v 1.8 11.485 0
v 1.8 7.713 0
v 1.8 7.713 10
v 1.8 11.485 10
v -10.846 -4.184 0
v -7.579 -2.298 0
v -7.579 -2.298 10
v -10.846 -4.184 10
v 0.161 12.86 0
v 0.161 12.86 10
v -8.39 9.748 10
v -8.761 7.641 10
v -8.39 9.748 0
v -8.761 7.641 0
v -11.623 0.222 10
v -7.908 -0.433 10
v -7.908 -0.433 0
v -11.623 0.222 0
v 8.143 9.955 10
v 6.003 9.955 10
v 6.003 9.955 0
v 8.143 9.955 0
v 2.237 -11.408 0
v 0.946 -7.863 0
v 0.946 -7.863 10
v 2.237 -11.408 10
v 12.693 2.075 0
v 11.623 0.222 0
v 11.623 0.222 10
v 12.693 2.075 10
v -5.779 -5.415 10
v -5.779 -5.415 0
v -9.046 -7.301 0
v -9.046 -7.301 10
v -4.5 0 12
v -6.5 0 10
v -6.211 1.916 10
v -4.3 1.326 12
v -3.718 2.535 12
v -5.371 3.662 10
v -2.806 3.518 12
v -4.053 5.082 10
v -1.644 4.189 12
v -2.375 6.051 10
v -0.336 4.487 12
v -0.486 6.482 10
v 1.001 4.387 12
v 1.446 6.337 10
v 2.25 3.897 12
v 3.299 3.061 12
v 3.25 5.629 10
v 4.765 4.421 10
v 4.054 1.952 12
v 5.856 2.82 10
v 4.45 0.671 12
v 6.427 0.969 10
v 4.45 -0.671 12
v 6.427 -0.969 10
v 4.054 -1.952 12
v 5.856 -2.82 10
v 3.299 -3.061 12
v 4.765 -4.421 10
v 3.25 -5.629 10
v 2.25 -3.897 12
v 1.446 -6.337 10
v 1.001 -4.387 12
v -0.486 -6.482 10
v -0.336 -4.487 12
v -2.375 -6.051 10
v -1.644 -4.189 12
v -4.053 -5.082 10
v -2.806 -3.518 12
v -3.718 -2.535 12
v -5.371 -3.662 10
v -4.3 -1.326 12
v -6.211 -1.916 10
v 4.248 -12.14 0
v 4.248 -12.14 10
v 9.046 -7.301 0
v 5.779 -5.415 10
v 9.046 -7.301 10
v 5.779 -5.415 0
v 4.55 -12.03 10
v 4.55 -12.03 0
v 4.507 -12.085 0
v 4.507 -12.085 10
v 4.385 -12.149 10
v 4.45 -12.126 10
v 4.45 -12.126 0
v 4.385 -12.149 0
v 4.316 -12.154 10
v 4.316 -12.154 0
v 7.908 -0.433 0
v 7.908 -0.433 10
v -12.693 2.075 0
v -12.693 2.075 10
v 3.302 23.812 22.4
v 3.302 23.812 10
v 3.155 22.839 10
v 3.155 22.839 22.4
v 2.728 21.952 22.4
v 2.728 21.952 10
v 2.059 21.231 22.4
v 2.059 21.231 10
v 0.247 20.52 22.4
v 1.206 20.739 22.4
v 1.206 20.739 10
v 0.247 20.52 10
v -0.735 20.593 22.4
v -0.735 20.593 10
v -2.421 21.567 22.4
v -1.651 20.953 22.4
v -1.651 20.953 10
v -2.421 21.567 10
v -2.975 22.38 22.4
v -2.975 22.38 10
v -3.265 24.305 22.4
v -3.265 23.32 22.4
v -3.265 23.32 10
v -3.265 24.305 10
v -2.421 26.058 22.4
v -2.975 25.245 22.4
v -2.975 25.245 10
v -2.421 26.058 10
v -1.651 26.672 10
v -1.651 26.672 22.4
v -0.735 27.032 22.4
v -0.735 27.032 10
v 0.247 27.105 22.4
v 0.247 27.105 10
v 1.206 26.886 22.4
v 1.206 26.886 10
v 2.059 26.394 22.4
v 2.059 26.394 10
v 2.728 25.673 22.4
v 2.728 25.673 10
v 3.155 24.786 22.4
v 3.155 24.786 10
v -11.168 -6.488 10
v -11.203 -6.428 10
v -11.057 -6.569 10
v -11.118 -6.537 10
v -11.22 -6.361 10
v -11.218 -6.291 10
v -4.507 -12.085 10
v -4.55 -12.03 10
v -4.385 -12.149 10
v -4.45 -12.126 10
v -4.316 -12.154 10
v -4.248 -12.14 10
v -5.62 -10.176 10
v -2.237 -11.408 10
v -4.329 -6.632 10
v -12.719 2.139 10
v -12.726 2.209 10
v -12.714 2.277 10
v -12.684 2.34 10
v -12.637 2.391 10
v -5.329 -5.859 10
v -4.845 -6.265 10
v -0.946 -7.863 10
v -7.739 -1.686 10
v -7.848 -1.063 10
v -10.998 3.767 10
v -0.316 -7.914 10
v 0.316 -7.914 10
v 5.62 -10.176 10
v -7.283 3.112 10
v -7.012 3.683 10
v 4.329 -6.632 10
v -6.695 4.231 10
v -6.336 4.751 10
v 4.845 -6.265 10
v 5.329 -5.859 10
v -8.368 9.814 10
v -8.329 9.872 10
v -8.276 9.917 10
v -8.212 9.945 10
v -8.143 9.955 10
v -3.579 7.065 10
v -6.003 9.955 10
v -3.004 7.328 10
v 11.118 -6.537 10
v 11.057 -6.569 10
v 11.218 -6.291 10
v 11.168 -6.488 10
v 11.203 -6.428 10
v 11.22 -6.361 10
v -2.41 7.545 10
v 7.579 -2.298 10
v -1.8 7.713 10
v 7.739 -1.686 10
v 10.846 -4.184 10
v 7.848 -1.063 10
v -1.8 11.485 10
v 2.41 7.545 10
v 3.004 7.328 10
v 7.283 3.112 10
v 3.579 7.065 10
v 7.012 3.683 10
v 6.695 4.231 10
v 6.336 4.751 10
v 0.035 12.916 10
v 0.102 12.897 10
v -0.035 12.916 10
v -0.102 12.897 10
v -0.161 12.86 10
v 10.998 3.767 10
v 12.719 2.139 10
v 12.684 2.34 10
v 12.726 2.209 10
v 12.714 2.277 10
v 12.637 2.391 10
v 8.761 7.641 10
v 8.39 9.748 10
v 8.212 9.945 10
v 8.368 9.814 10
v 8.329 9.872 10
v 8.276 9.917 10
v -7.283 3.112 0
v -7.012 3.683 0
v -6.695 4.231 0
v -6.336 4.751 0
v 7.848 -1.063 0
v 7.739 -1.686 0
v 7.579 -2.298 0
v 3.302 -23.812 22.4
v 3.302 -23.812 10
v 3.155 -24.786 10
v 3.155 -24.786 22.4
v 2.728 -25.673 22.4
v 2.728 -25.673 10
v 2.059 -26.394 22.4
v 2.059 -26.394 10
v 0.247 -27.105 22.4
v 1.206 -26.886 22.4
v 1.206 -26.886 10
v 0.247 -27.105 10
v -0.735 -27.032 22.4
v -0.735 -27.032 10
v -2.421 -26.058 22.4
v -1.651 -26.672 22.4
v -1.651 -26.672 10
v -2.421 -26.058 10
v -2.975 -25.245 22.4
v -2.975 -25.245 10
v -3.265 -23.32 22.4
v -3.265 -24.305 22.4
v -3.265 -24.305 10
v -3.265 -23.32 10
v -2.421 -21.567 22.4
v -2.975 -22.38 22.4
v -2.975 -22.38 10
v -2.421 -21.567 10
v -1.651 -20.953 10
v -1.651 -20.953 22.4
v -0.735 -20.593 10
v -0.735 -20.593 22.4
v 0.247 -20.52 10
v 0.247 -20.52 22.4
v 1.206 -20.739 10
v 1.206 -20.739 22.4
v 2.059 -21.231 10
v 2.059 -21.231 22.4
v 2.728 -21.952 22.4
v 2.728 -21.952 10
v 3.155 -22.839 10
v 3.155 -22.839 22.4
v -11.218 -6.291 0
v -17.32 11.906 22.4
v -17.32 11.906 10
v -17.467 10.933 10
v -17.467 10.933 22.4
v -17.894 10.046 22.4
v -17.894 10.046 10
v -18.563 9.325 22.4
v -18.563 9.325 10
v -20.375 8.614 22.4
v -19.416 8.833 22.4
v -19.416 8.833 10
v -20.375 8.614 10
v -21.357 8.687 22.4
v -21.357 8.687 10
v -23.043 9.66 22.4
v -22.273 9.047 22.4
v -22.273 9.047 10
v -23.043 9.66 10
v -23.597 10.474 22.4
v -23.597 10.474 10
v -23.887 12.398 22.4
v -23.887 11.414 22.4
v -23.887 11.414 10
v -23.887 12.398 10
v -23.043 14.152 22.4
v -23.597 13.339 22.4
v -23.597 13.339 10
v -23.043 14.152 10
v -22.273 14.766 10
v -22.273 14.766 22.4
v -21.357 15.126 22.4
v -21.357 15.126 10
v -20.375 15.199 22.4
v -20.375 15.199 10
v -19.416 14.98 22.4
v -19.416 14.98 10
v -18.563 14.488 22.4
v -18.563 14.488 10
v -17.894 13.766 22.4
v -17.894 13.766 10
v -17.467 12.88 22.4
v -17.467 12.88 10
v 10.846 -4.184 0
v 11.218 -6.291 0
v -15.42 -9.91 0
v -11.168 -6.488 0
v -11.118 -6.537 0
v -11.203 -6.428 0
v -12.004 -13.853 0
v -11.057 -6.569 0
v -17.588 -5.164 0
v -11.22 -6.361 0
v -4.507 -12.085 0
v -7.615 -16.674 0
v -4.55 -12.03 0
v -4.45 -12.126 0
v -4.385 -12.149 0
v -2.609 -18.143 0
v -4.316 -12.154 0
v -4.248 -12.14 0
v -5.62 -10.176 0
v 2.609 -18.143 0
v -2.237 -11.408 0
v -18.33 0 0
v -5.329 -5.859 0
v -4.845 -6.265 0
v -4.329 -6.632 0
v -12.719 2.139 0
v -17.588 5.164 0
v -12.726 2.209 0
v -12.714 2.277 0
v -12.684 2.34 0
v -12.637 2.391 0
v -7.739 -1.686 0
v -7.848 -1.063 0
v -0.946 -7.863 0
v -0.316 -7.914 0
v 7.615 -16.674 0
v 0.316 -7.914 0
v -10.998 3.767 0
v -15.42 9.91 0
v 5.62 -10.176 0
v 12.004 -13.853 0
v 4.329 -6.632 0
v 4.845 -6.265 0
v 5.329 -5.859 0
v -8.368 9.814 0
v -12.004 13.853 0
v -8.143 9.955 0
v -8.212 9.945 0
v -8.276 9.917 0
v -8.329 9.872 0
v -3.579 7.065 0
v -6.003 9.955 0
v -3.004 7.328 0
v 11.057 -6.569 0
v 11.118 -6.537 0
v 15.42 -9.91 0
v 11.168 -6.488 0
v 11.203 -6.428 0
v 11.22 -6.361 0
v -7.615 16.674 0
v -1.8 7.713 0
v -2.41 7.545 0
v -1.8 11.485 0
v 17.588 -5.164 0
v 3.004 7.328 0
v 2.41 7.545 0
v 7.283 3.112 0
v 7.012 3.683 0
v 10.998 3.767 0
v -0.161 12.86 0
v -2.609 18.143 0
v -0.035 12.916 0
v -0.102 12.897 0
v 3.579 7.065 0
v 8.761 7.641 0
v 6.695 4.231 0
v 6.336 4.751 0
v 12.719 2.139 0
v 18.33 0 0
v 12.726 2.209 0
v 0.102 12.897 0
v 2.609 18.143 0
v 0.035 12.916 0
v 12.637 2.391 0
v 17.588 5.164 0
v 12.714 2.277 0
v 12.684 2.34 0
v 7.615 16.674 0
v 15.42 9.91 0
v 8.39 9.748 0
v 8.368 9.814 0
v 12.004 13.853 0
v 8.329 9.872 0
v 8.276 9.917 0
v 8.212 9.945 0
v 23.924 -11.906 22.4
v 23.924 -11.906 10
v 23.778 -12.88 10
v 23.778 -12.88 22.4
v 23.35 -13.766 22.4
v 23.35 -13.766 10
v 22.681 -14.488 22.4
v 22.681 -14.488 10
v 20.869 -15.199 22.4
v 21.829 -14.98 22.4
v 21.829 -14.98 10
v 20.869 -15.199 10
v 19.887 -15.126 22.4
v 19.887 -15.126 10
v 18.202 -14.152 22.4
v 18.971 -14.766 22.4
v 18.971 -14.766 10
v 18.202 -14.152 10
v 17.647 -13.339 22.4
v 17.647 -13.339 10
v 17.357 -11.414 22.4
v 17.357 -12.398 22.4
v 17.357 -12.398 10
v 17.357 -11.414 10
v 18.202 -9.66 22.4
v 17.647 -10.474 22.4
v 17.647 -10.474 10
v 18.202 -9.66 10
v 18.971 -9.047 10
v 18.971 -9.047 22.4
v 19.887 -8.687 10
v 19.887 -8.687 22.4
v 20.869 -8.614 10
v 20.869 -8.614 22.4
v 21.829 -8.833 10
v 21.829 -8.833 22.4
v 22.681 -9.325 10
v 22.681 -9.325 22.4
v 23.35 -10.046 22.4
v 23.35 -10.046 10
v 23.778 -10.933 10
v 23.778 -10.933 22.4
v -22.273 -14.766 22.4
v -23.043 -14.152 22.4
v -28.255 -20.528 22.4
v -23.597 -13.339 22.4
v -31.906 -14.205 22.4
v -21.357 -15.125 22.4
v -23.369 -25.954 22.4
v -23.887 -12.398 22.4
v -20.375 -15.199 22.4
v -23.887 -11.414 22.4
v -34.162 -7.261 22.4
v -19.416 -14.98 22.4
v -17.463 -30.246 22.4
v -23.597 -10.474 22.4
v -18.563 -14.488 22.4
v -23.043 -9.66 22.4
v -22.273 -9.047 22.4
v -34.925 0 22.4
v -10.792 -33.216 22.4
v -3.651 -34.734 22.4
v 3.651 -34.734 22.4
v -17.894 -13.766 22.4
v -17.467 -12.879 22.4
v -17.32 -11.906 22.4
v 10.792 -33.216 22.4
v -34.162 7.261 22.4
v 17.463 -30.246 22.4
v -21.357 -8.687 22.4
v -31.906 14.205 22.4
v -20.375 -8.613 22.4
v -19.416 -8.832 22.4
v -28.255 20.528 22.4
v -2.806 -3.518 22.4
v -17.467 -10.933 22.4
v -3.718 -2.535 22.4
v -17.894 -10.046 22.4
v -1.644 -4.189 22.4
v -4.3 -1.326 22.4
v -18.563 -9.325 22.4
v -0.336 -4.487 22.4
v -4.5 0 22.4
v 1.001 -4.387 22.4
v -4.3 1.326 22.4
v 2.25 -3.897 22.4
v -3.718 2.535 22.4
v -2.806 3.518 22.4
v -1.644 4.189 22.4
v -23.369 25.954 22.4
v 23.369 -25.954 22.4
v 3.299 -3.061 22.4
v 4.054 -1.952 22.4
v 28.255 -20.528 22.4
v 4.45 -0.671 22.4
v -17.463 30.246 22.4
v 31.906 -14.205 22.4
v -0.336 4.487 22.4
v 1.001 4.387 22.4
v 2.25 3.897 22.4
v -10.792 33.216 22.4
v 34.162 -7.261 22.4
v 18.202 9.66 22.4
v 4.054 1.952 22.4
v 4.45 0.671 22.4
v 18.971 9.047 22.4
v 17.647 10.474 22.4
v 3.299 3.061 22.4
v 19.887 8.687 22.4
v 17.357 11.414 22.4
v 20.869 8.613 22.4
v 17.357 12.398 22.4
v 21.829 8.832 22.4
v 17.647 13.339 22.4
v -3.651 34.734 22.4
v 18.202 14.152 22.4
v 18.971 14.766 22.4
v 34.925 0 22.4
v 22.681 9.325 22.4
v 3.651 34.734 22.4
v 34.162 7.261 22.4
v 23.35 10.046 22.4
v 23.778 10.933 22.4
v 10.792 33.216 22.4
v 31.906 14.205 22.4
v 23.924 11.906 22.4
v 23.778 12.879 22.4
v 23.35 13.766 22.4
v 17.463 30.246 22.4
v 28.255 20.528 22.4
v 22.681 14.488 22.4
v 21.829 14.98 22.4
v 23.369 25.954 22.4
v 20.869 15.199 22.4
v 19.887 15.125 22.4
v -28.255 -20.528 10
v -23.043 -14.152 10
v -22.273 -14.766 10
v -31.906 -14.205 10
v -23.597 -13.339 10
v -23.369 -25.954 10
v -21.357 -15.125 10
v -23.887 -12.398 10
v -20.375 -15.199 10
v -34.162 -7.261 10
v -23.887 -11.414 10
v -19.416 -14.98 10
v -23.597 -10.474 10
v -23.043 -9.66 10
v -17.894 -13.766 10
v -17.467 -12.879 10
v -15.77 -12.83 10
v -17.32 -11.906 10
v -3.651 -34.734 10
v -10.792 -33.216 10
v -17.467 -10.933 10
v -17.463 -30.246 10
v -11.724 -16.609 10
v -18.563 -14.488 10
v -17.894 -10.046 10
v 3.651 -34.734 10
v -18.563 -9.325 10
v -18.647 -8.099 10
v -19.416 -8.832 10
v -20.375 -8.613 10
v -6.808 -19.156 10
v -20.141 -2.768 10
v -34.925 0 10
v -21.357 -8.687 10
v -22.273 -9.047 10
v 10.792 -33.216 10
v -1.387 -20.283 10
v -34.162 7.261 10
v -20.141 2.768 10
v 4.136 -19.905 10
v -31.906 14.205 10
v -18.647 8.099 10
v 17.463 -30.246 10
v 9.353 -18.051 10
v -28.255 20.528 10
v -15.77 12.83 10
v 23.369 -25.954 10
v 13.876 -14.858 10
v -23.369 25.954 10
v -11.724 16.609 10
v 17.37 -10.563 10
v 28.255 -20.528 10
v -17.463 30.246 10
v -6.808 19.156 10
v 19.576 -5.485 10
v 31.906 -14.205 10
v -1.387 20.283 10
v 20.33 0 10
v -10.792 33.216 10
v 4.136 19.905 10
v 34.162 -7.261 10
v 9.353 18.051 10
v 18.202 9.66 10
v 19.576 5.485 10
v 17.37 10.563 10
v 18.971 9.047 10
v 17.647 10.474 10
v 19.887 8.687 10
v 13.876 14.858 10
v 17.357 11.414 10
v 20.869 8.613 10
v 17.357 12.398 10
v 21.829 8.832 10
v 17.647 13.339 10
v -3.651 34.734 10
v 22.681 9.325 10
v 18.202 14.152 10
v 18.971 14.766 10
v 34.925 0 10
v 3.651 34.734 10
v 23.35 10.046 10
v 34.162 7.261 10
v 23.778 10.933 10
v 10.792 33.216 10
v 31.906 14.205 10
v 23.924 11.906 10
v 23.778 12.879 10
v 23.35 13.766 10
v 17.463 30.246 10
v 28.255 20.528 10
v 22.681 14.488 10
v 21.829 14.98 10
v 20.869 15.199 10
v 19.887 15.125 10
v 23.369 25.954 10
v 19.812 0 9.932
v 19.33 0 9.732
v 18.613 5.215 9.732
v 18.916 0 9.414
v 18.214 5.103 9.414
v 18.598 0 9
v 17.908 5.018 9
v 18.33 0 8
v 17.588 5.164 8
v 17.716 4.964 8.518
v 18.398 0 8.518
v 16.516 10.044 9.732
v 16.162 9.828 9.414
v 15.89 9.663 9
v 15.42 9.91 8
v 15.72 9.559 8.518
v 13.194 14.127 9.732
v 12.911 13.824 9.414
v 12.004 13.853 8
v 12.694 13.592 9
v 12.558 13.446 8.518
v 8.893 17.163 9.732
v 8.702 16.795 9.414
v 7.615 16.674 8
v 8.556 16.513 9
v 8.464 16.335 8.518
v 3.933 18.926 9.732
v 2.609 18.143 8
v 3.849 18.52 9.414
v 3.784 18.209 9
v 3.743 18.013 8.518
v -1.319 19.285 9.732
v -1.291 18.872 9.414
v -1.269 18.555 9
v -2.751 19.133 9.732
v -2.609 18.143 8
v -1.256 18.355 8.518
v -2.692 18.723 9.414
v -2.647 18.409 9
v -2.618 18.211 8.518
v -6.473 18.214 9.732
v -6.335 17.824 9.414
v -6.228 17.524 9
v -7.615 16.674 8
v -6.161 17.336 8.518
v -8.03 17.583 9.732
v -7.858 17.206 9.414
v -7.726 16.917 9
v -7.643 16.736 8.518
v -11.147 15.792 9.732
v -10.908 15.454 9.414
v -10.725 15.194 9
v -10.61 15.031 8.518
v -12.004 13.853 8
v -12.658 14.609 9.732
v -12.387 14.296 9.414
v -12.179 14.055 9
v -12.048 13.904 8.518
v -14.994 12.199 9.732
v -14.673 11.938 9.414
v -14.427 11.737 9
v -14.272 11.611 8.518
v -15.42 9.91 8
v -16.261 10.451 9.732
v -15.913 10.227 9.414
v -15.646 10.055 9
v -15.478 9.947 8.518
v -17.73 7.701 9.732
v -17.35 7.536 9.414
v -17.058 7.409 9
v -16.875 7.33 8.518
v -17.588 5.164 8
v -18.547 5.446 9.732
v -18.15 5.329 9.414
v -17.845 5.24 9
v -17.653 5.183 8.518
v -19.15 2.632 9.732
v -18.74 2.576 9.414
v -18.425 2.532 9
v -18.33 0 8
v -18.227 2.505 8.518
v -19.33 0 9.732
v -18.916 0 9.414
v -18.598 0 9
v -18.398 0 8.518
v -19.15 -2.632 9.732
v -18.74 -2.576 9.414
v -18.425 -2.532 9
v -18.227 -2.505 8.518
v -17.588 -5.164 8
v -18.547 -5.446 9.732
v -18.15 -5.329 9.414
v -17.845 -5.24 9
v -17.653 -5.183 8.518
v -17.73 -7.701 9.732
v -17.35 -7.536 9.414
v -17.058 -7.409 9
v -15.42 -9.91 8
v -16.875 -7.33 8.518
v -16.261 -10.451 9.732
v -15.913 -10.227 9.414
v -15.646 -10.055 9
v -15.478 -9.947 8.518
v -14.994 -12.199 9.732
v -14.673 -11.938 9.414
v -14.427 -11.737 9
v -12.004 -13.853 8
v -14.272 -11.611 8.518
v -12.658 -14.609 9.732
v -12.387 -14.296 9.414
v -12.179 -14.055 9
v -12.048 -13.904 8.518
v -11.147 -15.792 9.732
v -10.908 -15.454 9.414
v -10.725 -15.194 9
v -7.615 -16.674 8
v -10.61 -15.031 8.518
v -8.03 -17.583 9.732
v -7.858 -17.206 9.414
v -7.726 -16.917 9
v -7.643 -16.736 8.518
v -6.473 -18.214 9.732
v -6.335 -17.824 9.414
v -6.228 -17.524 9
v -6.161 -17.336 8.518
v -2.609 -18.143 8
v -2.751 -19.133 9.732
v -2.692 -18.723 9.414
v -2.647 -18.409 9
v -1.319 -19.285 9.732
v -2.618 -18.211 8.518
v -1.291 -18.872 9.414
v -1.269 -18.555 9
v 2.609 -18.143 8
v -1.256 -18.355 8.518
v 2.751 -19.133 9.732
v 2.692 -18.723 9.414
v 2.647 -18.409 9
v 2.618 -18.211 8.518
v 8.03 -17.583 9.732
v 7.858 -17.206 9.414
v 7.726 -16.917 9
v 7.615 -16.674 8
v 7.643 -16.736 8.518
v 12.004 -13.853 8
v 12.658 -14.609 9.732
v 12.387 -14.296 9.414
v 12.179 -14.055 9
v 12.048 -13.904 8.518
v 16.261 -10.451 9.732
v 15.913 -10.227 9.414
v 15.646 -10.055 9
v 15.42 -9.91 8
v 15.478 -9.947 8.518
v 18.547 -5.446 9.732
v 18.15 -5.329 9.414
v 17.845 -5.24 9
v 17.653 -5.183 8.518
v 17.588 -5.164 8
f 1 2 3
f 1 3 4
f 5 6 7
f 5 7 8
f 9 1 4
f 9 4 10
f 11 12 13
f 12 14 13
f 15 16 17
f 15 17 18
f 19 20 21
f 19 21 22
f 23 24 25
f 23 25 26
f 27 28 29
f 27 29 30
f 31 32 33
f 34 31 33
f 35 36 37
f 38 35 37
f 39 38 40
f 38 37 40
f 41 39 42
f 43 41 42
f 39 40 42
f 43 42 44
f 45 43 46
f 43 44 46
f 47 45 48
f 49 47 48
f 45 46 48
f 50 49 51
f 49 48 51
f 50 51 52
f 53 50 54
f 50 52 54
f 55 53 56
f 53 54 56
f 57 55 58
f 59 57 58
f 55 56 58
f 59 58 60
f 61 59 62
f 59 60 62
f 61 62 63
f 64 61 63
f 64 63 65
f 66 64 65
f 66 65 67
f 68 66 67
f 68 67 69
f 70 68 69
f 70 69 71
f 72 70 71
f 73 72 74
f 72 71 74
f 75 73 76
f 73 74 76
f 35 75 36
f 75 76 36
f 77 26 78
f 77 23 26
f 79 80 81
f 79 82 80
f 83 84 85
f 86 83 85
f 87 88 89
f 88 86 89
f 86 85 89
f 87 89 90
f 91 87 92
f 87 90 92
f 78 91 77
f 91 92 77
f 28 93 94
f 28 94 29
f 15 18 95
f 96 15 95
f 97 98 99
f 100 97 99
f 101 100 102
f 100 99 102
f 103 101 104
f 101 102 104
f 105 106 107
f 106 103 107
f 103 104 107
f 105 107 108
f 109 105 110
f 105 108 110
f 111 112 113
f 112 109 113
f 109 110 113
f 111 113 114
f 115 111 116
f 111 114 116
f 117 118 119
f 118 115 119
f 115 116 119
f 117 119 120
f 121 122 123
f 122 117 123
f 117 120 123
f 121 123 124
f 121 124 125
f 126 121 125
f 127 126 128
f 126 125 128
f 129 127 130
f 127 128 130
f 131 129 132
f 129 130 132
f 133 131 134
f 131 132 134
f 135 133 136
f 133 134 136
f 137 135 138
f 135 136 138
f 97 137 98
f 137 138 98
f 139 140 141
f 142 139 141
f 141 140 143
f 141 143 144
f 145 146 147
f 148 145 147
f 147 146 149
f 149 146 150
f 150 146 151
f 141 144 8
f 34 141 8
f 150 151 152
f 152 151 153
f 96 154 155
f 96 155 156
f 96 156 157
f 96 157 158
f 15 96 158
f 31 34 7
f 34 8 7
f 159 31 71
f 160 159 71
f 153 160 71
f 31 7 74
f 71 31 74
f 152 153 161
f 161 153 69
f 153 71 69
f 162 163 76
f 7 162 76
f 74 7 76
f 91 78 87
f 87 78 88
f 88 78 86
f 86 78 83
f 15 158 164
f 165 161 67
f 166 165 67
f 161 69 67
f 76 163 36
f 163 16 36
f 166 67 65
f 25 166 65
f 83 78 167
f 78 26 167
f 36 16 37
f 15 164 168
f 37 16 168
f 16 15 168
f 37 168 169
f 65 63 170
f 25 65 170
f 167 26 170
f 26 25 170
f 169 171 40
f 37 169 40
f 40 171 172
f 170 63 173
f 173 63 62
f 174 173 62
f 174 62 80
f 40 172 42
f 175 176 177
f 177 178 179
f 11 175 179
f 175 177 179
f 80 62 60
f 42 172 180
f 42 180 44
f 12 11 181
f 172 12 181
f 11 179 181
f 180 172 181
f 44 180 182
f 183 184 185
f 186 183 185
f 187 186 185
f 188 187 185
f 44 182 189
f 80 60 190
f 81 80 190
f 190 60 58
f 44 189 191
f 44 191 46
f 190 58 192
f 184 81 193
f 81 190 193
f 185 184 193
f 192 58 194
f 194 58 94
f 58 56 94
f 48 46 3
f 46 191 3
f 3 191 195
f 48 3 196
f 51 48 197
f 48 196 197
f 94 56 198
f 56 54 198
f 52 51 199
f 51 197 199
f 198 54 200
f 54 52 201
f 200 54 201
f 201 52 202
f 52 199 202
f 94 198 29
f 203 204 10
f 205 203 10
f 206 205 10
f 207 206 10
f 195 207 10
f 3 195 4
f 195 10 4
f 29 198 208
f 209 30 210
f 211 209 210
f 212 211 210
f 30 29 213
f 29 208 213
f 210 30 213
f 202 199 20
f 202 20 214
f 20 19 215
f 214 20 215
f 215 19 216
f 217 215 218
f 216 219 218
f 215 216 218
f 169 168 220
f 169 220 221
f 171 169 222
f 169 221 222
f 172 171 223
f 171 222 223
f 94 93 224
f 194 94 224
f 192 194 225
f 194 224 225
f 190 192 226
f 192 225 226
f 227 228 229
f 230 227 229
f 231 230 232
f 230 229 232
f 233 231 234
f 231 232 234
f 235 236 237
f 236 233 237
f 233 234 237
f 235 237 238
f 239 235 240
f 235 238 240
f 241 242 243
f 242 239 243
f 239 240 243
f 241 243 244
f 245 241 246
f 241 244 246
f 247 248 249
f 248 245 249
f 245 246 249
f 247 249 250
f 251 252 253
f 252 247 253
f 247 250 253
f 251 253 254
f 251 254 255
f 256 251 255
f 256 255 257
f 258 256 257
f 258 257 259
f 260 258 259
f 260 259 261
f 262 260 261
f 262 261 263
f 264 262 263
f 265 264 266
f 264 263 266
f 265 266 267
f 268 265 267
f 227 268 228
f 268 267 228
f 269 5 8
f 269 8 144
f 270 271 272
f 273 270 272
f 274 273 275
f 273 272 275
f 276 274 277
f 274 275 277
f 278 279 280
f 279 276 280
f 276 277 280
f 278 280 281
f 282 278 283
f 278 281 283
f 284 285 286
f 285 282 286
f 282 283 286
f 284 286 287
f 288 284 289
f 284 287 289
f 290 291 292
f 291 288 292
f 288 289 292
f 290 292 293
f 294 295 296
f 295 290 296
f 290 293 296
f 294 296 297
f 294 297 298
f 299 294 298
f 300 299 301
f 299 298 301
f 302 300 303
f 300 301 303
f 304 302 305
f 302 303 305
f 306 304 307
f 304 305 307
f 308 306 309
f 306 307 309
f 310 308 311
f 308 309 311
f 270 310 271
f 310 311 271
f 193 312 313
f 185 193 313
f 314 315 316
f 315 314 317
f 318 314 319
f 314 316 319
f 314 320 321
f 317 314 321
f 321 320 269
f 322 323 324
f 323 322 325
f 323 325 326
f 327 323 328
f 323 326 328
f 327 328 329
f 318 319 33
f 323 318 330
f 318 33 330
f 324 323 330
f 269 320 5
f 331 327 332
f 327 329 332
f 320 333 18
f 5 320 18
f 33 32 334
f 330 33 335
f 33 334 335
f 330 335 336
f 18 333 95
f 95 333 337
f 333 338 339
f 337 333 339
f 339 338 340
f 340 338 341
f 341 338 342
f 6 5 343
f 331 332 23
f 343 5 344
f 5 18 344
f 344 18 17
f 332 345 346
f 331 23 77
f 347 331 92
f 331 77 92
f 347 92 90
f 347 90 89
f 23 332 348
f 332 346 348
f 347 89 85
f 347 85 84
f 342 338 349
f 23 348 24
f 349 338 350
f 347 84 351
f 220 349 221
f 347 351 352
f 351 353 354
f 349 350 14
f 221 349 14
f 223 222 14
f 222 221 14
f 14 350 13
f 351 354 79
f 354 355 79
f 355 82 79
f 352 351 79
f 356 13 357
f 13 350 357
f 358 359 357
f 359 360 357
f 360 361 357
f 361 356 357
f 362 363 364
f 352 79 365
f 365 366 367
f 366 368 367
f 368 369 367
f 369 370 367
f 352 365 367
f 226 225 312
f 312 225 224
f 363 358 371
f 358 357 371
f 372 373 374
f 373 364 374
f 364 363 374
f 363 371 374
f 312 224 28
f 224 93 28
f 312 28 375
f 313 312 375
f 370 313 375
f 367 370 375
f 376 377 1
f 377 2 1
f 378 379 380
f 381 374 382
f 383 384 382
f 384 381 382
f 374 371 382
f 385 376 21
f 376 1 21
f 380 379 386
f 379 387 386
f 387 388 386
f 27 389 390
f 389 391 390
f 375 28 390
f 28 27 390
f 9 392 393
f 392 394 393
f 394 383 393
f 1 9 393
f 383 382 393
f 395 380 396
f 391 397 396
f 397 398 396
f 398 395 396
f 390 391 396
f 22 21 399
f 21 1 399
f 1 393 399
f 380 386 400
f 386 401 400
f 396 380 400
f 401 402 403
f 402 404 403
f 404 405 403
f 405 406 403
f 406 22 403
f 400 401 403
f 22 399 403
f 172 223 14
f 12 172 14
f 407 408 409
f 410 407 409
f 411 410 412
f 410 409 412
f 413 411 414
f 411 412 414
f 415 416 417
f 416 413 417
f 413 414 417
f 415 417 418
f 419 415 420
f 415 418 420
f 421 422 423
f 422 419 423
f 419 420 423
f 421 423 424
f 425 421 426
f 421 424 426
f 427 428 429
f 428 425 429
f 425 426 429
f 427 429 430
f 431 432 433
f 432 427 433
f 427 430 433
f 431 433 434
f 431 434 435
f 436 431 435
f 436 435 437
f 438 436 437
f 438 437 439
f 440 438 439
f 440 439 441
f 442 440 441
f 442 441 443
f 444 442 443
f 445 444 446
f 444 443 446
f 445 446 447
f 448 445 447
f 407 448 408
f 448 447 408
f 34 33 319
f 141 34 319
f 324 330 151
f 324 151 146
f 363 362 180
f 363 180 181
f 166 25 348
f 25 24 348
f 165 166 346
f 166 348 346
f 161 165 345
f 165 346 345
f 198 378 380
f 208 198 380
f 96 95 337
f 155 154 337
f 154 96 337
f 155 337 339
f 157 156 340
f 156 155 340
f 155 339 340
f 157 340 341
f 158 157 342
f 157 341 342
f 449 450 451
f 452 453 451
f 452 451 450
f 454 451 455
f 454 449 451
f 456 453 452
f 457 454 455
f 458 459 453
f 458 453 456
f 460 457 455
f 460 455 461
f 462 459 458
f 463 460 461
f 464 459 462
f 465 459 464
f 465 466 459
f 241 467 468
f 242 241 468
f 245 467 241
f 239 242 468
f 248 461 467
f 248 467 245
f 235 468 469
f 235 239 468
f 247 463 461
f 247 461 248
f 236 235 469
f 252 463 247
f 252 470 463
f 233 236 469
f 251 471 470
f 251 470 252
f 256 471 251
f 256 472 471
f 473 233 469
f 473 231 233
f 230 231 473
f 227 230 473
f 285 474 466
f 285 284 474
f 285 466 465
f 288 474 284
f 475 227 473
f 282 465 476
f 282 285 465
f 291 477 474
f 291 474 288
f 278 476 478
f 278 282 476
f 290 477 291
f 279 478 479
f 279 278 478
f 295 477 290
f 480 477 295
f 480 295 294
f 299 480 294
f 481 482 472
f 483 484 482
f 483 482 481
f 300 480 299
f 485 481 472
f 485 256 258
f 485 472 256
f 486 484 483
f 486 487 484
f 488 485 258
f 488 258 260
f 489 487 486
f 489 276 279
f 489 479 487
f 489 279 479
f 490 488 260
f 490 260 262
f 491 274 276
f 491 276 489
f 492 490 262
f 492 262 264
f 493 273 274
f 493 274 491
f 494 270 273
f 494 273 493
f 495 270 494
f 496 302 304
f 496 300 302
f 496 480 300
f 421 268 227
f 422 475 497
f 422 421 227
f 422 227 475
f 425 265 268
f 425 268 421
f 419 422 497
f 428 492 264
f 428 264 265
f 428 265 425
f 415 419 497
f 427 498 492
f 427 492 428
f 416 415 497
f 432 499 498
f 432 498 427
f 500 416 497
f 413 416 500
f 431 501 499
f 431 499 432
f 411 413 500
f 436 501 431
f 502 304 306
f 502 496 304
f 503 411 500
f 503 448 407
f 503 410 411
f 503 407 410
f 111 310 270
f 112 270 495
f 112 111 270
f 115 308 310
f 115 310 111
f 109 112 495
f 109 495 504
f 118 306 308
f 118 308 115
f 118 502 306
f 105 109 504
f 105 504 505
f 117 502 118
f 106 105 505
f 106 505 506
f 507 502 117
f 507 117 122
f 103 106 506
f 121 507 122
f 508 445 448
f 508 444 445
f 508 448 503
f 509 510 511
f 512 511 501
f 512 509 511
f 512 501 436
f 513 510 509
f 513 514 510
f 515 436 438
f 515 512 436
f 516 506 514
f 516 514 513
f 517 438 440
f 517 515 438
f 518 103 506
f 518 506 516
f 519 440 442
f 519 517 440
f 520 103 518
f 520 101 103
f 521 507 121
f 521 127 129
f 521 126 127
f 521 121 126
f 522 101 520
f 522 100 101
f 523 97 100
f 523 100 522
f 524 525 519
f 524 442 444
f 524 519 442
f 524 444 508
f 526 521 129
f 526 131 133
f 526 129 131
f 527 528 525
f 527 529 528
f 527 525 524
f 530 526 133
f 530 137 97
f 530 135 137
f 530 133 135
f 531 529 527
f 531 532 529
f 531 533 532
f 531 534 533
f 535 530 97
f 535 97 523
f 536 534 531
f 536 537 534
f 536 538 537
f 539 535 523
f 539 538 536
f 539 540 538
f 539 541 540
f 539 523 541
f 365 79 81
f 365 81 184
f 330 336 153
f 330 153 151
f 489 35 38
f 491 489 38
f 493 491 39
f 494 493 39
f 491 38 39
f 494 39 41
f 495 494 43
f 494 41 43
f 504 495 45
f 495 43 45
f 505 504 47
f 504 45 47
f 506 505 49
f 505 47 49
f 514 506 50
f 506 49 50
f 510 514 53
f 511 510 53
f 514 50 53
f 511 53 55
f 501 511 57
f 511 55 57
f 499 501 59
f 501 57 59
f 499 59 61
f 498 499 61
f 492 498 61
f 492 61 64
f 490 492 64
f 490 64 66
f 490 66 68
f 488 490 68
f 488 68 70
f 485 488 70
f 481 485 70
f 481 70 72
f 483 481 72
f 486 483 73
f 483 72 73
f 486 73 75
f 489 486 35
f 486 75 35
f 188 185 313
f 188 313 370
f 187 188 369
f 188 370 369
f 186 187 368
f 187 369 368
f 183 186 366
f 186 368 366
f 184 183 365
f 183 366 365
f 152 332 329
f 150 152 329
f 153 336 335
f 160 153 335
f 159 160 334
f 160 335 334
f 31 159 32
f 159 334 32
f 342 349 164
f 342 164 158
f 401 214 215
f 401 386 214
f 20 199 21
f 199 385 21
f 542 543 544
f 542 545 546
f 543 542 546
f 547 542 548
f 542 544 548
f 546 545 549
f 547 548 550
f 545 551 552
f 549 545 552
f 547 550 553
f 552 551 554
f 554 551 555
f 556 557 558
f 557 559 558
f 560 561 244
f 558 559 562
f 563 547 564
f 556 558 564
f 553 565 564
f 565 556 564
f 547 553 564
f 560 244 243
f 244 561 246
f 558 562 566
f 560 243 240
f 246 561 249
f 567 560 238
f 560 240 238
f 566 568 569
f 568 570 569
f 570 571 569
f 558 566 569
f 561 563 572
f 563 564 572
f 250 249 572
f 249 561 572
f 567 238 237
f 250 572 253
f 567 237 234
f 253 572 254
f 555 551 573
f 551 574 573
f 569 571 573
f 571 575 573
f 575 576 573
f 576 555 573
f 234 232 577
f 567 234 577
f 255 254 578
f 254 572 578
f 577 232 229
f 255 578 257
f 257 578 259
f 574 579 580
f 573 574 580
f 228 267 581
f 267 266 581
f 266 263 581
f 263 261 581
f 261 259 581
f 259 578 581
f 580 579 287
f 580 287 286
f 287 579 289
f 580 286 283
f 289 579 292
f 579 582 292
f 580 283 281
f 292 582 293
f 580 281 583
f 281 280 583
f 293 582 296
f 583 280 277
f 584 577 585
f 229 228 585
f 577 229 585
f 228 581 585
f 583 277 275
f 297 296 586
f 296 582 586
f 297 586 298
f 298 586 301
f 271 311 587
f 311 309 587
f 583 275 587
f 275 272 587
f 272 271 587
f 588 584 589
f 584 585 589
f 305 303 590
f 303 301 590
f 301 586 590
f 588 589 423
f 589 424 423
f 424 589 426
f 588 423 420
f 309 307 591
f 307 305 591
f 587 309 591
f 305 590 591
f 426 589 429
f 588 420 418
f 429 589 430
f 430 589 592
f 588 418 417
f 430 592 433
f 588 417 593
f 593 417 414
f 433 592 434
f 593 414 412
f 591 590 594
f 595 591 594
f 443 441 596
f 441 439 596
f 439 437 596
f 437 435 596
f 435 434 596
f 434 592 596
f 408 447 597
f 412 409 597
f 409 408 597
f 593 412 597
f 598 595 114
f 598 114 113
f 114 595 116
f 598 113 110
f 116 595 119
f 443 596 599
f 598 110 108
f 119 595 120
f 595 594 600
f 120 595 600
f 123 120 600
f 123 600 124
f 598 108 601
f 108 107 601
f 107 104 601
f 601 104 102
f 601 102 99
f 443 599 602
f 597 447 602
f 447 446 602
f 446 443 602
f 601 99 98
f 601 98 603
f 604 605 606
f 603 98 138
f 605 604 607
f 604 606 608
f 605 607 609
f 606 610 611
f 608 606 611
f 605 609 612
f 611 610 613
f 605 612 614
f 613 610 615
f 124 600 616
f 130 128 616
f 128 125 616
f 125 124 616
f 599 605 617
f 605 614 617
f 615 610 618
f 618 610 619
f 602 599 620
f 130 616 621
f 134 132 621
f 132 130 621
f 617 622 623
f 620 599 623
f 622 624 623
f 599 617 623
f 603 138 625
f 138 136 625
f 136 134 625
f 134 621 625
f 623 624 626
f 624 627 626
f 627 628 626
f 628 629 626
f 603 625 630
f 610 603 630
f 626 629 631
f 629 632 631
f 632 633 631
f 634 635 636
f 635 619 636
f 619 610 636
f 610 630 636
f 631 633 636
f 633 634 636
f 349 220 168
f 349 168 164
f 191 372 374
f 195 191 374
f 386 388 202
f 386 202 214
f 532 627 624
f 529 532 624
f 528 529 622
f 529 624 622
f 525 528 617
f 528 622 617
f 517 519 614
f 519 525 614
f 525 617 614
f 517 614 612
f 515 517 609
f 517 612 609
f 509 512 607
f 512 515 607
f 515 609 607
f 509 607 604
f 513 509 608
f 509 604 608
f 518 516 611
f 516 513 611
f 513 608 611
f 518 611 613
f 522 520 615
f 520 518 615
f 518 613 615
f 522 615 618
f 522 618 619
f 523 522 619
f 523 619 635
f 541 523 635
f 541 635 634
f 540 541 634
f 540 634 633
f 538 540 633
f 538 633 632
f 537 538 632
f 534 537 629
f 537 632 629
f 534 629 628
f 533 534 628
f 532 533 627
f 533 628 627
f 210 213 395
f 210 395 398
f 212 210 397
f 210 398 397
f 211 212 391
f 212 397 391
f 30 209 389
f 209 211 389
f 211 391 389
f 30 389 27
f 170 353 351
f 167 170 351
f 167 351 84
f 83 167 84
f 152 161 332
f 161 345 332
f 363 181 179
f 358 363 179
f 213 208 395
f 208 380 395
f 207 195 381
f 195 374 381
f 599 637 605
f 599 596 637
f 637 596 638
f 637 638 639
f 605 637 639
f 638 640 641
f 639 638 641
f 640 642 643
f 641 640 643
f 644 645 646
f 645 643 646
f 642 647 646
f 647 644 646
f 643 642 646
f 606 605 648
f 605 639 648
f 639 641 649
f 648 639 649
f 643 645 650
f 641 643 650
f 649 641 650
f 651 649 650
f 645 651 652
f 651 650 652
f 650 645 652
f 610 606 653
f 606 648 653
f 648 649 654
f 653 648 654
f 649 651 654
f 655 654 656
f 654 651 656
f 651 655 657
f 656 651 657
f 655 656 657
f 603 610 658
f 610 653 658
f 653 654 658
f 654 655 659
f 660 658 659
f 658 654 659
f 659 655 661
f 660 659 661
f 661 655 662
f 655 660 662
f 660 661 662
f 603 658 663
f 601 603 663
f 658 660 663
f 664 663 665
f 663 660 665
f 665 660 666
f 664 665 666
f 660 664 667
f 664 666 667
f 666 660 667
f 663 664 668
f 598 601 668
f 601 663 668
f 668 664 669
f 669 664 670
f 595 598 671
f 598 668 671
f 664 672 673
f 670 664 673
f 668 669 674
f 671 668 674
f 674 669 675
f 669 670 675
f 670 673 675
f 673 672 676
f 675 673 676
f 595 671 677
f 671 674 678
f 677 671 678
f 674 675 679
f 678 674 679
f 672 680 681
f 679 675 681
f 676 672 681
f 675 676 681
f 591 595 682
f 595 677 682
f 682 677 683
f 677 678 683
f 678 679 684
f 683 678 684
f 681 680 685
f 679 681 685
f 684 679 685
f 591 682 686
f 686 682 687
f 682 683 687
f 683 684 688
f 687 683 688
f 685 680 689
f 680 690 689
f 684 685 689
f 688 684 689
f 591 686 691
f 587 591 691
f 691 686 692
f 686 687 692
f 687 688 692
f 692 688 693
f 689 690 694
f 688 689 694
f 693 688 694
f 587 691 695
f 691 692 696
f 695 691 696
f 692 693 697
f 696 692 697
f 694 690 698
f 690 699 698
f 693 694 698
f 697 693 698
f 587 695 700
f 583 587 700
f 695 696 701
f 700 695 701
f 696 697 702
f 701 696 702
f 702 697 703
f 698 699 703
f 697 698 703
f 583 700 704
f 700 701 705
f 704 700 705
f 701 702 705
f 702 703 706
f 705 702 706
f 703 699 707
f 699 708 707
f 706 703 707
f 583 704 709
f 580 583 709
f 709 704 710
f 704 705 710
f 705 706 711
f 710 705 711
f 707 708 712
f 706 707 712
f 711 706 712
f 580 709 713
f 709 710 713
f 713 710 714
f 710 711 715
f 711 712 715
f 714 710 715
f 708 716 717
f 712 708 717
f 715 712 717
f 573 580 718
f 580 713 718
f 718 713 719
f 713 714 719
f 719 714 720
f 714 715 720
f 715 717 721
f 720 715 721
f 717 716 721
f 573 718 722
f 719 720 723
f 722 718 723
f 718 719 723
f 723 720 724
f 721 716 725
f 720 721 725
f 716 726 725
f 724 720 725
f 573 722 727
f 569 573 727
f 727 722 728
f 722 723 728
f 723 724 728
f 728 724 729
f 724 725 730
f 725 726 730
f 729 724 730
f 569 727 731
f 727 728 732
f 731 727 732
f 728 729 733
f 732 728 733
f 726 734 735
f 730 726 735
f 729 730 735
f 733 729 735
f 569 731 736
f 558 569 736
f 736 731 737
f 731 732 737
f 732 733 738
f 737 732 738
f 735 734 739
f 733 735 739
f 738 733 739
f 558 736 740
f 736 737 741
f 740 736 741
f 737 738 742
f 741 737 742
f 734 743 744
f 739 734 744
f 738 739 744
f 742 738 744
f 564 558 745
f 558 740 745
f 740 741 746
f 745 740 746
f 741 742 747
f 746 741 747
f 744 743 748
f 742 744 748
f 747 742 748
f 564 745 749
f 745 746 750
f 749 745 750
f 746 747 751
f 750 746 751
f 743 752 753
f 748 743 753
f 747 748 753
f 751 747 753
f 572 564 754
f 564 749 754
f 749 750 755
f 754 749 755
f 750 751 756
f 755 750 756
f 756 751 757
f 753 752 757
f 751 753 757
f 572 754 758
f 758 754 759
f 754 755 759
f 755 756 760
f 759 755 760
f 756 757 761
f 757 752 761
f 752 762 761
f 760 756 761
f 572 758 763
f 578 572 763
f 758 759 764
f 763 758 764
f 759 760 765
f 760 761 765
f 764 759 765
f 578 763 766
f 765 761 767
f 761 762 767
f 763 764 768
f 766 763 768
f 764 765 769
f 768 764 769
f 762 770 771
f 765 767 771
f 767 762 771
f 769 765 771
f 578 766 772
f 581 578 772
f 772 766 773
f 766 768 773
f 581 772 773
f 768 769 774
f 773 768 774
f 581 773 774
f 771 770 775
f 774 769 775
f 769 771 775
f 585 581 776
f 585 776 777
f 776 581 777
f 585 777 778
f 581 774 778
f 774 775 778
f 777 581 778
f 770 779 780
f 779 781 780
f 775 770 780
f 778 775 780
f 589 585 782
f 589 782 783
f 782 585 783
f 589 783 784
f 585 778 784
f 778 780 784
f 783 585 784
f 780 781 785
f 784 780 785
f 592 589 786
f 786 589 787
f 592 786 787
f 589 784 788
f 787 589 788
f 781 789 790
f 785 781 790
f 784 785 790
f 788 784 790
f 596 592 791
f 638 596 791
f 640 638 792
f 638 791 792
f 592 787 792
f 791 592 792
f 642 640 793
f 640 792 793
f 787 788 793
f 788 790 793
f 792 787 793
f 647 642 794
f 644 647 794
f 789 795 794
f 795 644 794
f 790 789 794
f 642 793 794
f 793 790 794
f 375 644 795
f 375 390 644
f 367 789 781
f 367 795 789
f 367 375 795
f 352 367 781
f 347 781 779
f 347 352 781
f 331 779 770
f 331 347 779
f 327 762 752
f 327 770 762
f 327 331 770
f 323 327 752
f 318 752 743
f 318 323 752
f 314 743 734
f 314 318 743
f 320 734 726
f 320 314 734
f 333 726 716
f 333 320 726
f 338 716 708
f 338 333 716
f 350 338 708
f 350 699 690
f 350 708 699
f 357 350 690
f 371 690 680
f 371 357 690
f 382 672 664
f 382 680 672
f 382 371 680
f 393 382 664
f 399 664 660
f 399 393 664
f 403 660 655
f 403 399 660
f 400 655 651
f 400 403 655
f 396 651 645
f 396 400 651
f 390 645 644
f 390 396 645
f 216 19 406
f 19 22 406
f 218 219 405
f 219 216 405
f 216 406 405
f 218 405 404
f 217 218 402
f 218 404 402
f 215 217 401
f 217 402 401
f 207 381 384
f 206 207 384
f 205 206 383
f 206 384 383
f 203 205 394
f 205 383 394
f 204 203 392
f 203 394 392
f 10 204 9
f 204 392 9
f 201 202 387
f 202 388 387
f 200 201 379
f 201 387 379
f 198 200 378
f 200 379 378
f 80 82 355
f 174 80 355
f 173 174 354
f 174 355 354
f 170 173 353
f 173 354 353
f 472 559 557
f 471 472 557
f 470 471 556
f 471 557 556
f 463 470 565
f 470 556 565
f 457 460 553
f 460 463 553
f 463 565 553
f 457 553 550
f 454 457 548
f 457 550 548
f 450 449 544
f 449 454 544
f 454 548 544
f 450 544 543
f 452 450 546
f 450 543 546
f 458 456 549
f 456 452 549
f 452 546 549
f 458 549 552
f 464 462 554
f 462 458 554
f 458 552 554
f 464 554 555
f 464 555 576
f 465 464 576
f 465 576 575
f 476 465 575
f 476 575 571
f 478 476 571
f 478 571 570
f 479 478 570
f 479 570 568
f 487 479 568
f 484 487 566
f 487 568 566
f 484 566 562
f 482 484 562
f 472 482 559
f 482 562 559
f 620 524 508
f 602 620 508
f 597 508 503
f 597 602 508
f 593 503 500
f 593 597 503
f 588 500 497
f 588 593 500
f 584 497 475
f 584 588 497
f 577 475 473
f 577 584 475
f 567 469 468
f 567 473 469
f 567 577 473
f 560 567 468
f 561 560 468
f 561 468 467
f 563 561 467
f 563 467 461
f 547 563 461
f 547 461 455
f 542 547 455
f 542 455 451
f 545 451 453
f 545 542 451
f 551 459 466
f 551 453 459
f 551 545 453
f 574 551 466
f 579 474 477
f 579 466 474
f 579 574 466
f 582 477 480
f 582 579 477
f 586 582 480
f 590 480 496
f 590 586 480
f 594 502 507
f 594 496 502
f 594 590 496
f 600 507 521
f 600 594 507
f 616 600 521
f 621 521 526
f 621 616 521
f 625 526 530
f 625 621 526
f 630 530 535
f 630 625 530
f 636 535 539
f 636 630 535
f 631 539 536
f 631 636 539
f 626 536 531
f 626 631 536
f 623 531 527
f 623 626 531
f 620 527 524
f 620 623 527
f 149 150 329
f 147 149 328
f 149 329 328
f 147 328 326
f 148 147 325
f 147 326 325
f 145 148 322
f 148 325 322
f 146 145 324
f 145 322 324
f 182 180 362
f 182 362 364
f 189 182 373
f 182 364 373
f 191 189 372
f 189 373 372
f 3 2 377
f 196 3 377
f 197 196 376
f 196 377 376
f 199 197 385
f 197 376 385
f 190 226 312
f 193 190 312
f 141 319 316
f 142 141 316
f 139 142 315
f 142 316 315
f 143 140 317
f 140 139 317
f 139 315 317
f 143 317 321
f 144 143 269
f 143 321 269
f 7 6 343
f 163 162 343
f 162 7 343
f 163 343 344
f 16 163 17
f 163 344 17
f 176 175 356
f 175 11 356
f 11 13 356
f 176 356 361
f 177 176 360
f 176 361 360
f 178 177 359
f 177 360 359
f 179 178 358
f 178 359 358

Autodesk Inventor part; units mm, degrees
ref_plane "YZ Plane" through (0, 0, 0) normal (1, 0, 0) x (0, 1, 0)
sketch "Sketch1" plane through (0, 0, 0) normal (0, 0, 1) x (1, 0, 0)
  circle A0 centre (0, 0) radius 18.33
  arc A1 (-1.8, 7.7127) -> (-3.5788, 7.0653) centre (0, 0) ccw
  arc A2 (3.5788, 7.0653) -> (1.8, 7.7127) centre (0, 0) ccw
  arc A3 (7.3109, 3.0458) -> (6.3365, 4.7513) centre (0, 0) ccw
  arc A4 (7.5794, -2.2975) -> (7.9081, -0.4334) centre (0, 0) ccw
  arc A5 (4.3294, -6.632) -> (5.7794, -5.4152) centre (0, 0) ccw
  arc A6 (-0.9465, -7.8632) -> (0.9465, -7.8632) centre (0, 0) ccw
  arc A7 (-5.7794, -5.4152) -> (-4.3294, -6.632) centre (0, 0) ccw
  arc A8 (-6.3365, 4.7513) -> (-7.283, 3.112) centre (0, 0) ccw
  arc A9 (-7.9081, -0.4334) -> (-7.5794, -2.2975) centre (0, 0) ccw
  line L0 (-0.9465, -7.8632) -> (-2.2366, -11.4078)
  line L1 (-4.3294, -6.632) -> (-5.6195, -10.1765)
  line L2 (-5.6195, -10.1765) -> (-4.5495, -12.0298)
  line L3 (-2.2366, -11.4078) -> (-4.2475, -12.1397)
  arc A10 (-4.5495, -12.0298) -> (-4.2475, -12.1397) centre (-4.333, -11.9048) ccw
  line L4 (4.3294, -6.632) -> (5.6195, -10.1765)
  line L5 (0.9465, -7.8632) -> (2.2366, -11.4078)
  line L6 (2.2366, -11.4078) -> (4.2475, -12.1397)
  line L7 (5.6195, -10.1765) -> (4.5495, -12.0298)
  arc A11 (4.2475, -12.1397) -> (4.5495, -12.0298) centre (4.333, -11.9048) ccw
  line L8 (7.5794, -2.2975) -> (10.8461, -4.1836)
  line L9 (5.7794, -5.4152) -> (9.0461, -7.3012)
  line L10 (9.0461, -7.3012) -> (11.057, -6.5693)
  line L11 (10.8461, -4.1836) -> (11.2177, -6.291)
  arc A12 (11.057, -6.5693) -> (11.2177, -6.291) centre (10.9715, -6.3344) ccw
  line L12 (7.283, 3.112) -> (10.9978, 3.767)
  line L13 (7.9081, -0.4334) -> (11.6229, 0.2217)
  line L14 (11.6229, 0.2217) -> (12.6929, 2.0749)
  line L15 (10.9978, 3.767) -> (12.6371, 2.3914)
  arc A13 (12.6929, 2.0749) -> (12.6371, 2.3914) centre (12.4764, 2.1999) ccw
  line L16 (3.5788, 7.0653) -> (6.0034, 9.9549)
  line L17 (6.3365, 4.7513) -> (8.7612, 7.6408)
  line L18 (8.7612, 7.6408) -> (8.3896, 9.7483)
  line L19 (6.0034, 9.9549) -> (8.1434, 9.9549)
  arc A14 (8.3896, 9.7483) -> (8.1434, 9.9549) centre (8.1434, 9.7049) ccw
  line L20 (-1.8, 7.7127) -> (-1.8, 11.4848)
  line L21 (1.8, 7.7127) -> (1.8, 11.4848)
  line L22 (1.8, 11.4848) -> (0.1607, 12.8603)
  line L23 (-1.8, 11.4848) -> (-0.1607, 12.8603)
  arc A15 (0.1607, 12.8603) -> (-0.1607, 12.8603) centre (0, 12.6688) ccw
  line L24 (-6.3365, 4.7513) -> (-8.7612, 7.6408)
  line L25 (-3.5788, 7.0653) -> (-6.0034, 9.9549)
  line L26 (-6.0034, 9.9549) -> (-8.1434, 9.9549)
  line L27 (-8.7612, 7.6408) -> (-8.3896, 9.7483)
  arc A16 (-8.1434, 9.9549) -> (-8.3896, 9.7483) centre (-8.1434, 9.7049) ccw
  line L28 (-7.9081, -0.4334) -> (-11.6229, 0.2217)
  line L29 (-7.283, 3.112) -> (-10.9978, 3.767)
  line L30 (-10.9978, 3.767) -> (-12.6371, 2.3914)
  line L31 (-11.6229, 0.2217) -> (-12.6929, 2.0749)
  arc A17 (-12.6371, 2.3914) -> (-12.6929, 2.0749) centre (-12.4764, 2.1999) ccw
  line L32 (-5.7794, -5.4152) -> (-9.0461, -7.3012)
  line L33 (-7.5794, -2.2975) -> (-10.8461, -4.1836)
  line L34 (-10.8461, -4.1836) -> (-11.2177, -6.291)
  line L35 (-9.0461, -7.3012) -> (-11.057, -6.5693)
  arc A18 (-11.2177, -6.291) -> (-11.057, -6.5693) centre (-10.9715, -6.3344) ccw
  arc A19 (-0.9465, -7.8632) -> (0.9465, -7.8632) centre (0, 0) ccw
  arc A20 (4.3294, -6.632) -> (5.7794, -5.4152) centre (0, 0) ccw
  arc A21 (7.5794, -2.2975) -> (7.9081, -0.4334) centre (0, 0) ccw
  arc A22 (7.283, 3.112) -> (6.3365, 4.7513) centre (0, 0) ccw
  arc A23 (3.5788, 7.0653) -> (1.8, 7.7127) centre (0, 0) ccw
  arc A24 (-1.8, 7.7127) -> (-3.5788, 7.0653) centre (0, 0) ccw
  arc A25 (-6.3365, 4.7513) -> (-7.283, 3.112) centre (0, 0) ccw
  arc A26 (-7.9081, -0.4334) -> (-7.5794, -2.2975) centre (0, 0) ccw
  arc A27 (-5.7794, -5.4152) -> (-4.3294, -6.632) centre (0, 0) ccw
  point P0 (-2.306, -11.394)
  point P1 (-5.5574, -10.2106)
  dimension "d58" = 0.25
  dimension "d61" = 360
ref_plane "Work Plane1" through (0, 0, 10) normal (0, 0, 1) x (1, 0, 0)
sketch "Sketch2" plane through (0, 0, 10) normal (0, 0, 1) x (1, 0, 0)
  circle A0 centre (0, 0) radius 34.925
  circle A1 centre (0, 23.8125) radius 3.302
  circle A2 centre (-20.6222, 11.9063) radius 3.302
  circle A3 centre (-20.6222, -11.9062) radius 3.302
  circle A4 centre (0, -23.8125) radius 3.302
  circle A5 centre (20.6222, -11.9063) radius 3.302
  circle A6 centre (20.6222, 11.9062) radius 3.302
  dimension "d42" = 69.85
  dimension "d44" = 6.604
  dimension "d47" = 360
extrude "Extrusion2" add sketch "Sketch2" along normal blind 6.35
ref_plane "Work Plane2" through (0, 0, 10) normal (0, 0, -1) x (-1, 0, 0)
extrude "Extrusion4" add sketch "Sketch1" along normal up to surface (10 mm away)
sketch "Sketch4" plane through (0, 0, 10) normal (0, 0, -1) x (-1, 0, 0)
  circle A0 centre (0, 0) radius 4.5
  dimension "d65" = 9
extrude "Extrusion5" cut sketch "Sketch4" against normal blind 10
fillet "Fillet1" radius 2 1 edges at (-18.33, 0, 10)
sketch "Sketch6" plane through (0, 0, 16.35) normal (0, 0, 1) x (1, 0, 0)
  circle A0 centre (0, 0) radius 34.925
  circle A1 centre (0, -23.8125) radius 3.302 projected
  circle A2 centre (0, -23.8125) radius 3.302
  circle A3 centre (20.6222, -11.9063) radius 3.302
  circle A4 centre (20.6222, 11.9062) radius 3.302
  circle A5 centre (0, 23.8125) radius 3.302
  circle A6 centre (-20.6222, 11.9063) radius 3.302
  circle A7 centre (-20.6222, -11.9062) radius 3.302
  dimension "d77" = 360
extrude "Extrusion7" add sketch "Sketch6" along normal blind 6.05
sketch "Sketch7" plane through (0, 0, 16.35) normal (0, 0, -1) x (-1, 0, 0)
  circle A0 centre (0, 0) radius 4.5
extrude "Extrusion8" cut sketch "Sketch7" against normal up to surface (6.05 mm away)
chamfer "Chamfer1" distance 2 angle 45 1 edges at (4.5, 0, 10)
properties part number "Window Motor Adapter"
